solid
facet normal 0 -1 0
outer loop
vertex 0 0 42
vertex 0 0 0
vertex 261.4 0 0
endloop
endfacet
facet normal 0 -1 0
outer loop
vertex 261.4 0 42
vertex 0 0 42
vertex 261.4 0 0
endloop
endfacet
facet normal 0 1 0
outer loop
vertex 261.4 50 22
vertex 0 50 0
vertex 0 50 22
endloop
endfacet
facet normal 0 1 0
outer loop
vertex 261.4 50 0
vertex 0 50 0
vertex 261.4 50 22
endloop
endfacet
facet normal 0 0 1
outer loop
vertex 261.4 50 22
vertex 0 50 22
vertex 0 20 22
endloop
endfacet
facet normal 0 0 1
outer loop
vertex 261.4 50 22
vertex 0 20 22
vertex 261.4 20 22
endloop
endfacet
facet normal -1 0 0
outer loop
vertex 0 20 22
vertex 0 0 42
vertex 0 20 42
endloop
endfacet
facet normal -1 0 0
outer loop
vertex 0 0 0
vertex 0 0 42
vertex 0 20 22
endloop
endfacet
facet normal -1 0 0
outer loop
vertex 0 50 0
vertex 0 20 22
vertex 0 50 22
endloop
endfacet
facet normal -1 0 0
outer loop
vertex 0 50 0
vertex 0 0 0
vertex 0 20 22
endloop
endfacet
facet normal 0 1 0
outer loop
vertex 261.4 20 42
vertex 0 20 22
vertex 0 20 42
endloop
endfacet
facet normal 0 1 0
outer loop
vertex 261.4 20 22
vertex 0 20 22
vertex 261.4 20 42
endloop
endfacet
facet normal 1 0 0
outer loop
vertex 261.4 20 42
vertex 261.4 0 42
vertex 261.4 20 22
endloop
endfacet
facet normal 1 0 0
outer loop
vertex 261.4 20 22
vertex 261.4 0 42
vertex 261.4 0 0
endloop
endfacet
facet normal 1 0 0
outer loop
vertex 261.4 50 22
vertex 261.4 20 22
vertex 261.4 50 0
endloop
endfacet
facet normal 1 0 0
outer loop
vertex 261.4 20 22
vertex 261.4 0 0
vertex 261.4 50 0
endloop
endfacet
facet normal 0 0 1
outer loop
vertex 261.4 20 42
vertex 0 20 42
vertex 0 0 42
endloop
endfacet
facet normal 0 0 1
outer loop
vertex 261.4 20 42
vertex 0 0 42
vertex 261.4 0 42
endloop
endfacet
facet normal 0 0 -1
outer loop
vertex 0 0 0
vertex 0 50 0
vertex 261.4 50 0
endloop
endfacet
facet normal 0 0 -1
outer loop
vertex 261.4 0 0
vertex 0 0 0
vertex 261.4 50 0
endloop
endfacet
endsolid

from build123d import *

# Parameters (mm, degrees)
ESQUISSE2_W                  = 261.4
ESQUISSE2_H                  = 50
BOSS_EXTRU_1_DEPTH           = 42
ENL_V_MAT_EXTRU_1_DEPTH      = 270.432663202
ENL_V_MAT_EXTRU_1_DEPTH_BACK = 20


with BuildPart() as part:
    # Esquisse2 → Boss.-Extru.1 (new body)
    with BuildSketch(Plane.XY):
        with Locations((130.7, 25)):
            Rectangle(ESQUISSE2_W, ESQUISSE2_H)
    extrude(amount=BOSS_EXTRU_1_DEPTH)

    # Esquisse3 → Enlèv. mat.-Extru.1 (cut, two sides: drawn at the far end of the back side and taken through both)
    with BuildSketch(Plane.XY.offset(42).offset(-ENL_V_MAT_EXTRU_1_DEPTH_BACK)):
        Polygon((-536.231736025, 20), (0, 20), (261.4, 20), (797.631736025, 20), (797.631736025, 1092.46347205), (-536.231736025, 1092.46347205), align=None)
    extrude(amount=ENL_V_MAT_EXTRU_1_DEPTH + ENL_V_MAT_EXTRU_1_DEPTH_BACK, mode=Mode.SUBTRACT)


solid = part.part
